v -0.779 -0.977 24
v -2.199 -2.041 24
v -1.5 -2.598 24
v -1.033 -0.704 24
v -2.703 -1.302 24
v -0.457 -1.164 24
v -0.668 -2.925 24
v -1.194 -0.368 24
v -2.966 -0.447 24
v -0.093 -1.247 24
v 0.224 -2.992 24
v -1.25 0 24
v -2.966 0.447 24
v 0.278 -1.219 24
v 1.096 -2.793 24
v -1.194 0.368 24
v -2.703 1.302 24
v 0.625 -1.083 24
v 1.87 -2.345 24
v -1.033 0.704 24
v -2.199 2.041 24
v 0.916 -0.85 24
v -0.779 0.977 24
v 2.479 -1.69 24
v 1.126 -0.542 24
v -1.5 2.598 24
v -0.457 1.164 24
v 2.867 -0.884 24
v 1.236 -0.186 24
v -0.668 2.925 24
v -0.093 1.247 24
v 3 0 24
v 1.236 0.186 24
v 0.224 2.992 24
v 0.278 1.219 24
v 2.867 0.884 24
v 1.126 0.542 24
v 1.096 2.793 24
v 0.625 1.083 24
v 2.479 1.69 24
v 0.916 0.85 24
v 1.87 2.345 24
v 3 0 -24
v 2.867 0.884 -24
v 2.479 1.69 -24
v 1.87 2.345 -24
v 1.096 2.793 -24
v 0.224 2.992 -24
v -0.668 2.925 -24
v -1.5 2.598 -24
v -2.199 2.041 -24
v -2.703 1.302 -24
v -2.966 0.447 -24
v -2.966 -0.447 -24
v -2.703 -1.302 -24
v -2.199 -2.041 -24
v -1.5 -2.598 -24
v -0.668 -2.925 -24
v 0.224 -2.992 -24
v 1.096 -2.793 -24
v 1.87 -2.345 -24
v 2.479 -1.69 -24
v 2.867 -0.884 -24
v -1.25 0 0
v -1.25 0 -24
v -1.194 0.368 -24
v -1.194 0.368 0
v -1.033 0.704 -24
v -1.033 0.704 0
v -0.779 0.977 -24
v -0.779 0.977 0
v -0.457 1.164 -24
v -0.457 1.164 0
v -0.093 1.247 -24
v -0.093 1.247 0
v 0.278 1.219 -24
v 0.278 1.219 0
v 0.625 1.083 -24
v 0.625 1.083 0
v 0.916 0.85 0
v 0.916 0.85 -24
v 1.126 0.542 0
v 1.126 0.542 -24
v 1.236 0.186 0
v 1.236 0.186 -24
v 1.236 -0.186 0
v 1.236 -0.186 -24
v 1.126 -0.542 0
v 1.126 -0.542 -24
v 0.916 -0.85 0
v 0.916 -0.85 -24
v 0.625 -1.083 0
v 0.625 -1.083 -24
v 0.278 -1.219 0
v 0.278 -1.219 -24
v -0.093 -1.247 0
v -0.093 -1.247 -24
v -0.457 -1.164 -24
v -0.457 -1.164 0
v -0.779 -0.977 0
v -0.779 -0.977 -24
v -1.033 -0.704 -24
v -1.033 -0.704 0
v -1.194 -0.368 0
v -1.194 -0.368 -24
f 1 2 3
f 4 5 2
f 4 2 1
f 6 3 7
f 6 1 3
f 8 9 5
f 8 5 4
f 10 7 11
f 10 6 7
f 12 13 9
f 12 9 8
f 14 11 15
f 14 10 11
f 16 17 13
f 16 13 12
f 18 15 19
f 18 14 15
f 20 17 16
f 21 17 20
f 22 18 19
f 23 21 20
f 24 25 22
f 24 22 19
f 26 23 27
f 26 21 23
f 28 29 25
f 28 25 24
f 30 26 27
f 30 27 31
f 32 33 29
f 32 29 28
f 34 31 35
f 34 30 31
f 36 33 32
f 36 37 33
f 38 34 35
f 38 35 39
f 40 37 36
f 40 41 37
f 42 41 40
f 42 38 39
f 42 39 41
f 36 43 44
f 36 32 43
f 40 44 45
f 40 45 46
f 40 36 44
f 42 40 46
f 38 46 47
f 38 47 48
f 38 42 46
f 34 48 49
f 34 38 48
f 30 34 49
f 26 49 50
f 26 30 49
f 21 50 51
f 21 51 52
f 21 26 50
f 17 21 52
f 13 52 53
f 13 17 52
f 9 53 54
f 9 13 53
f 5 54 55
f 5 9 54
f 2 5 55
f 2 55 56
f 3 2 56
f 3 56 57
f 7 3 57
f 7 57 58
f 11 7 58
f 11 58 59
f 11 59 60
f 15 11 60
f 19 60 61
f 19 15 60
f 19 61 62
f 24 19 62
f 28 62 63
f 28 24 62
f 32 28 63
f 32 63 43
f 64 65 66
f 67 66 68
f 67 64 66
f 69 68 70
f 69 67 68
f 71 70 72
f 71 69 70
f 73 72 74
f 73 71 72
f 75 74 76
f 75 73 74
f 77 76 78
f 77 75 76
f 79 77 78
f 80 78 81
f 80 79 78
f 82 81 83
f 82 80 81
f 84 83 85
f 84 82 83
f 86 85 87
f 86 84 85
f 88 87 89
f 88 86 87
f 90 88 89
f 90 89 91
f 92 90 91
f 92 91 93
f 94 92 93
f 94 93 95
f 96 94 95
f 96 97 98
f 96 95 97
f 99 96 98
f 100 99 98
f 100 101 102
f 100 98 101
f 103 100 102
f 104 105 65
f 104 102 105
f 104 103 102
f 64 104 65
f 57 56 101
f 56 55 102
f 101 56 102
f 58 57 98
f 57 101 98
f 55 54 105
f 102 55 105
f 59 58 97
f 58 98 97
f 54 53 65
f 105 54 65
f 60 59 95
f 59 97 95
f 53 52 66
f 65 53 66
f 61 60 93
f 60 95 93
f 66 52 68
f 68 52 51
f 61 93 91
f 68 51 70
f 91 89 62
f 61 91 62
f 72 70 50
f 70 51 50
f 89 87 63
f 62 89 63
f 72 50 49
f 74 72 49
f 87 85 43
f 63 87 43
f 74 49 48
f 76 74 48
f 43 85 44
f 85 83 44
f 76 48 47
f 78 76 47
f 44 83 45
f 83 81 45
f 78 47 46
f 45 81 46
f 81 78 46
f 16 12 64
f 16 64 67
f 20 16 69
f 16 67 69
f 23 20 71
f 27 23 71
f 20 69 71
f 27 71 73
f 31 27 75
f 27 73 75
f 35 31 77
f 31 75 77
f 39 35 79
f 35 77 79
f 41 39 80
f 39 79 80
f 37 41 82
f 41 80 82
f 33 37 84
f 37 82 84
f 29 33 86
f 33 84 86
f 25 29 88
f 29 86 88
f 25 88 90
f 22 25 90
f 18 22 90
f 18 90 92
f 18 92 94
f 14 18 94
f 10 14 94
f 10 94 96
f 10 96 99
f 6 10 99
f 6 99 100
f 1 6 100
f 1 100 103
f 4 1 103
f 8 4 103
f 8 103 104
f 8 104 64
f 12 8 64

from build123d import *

# Parameters (mm, degrees)
SKETCH1_R                 = 3
BOSS_EXTRUDE1_DEPTH       = 24
M3X0_5_TAPPED_HOLE1_D     = 2.5
M3X0_5_TAPPED_HOLE1_DEPTH = 24


with BuildPart() as part:
    # Sketch1 → Boss-Extrude1 (new, symmetric)
    with BuildSketch(Plane.XY):
        Circle(SKETCH1_R)
    extrude(amount=BOSS_EXTRUDE1_DEPTH, both=True)

    # M3x0.5 Tapped Hole1
    with Locations(Plane.XY.offset(24)):
        with Locations((0, 0)):
            m3x0_5_tapped_hole1 = Hole(M3X0_5_TAPPED_HOLE1_D / 2, depth=M3X0_5_TAPPED_HOLE1_DEPTH)

    # Mirror1: M3x0.5 Tapped Hole1 across plane
    add(m3x0_5_tapped_hole1.mirror(Plane.XY), mode=Mode.SUBTRACT)


solid = part.part
